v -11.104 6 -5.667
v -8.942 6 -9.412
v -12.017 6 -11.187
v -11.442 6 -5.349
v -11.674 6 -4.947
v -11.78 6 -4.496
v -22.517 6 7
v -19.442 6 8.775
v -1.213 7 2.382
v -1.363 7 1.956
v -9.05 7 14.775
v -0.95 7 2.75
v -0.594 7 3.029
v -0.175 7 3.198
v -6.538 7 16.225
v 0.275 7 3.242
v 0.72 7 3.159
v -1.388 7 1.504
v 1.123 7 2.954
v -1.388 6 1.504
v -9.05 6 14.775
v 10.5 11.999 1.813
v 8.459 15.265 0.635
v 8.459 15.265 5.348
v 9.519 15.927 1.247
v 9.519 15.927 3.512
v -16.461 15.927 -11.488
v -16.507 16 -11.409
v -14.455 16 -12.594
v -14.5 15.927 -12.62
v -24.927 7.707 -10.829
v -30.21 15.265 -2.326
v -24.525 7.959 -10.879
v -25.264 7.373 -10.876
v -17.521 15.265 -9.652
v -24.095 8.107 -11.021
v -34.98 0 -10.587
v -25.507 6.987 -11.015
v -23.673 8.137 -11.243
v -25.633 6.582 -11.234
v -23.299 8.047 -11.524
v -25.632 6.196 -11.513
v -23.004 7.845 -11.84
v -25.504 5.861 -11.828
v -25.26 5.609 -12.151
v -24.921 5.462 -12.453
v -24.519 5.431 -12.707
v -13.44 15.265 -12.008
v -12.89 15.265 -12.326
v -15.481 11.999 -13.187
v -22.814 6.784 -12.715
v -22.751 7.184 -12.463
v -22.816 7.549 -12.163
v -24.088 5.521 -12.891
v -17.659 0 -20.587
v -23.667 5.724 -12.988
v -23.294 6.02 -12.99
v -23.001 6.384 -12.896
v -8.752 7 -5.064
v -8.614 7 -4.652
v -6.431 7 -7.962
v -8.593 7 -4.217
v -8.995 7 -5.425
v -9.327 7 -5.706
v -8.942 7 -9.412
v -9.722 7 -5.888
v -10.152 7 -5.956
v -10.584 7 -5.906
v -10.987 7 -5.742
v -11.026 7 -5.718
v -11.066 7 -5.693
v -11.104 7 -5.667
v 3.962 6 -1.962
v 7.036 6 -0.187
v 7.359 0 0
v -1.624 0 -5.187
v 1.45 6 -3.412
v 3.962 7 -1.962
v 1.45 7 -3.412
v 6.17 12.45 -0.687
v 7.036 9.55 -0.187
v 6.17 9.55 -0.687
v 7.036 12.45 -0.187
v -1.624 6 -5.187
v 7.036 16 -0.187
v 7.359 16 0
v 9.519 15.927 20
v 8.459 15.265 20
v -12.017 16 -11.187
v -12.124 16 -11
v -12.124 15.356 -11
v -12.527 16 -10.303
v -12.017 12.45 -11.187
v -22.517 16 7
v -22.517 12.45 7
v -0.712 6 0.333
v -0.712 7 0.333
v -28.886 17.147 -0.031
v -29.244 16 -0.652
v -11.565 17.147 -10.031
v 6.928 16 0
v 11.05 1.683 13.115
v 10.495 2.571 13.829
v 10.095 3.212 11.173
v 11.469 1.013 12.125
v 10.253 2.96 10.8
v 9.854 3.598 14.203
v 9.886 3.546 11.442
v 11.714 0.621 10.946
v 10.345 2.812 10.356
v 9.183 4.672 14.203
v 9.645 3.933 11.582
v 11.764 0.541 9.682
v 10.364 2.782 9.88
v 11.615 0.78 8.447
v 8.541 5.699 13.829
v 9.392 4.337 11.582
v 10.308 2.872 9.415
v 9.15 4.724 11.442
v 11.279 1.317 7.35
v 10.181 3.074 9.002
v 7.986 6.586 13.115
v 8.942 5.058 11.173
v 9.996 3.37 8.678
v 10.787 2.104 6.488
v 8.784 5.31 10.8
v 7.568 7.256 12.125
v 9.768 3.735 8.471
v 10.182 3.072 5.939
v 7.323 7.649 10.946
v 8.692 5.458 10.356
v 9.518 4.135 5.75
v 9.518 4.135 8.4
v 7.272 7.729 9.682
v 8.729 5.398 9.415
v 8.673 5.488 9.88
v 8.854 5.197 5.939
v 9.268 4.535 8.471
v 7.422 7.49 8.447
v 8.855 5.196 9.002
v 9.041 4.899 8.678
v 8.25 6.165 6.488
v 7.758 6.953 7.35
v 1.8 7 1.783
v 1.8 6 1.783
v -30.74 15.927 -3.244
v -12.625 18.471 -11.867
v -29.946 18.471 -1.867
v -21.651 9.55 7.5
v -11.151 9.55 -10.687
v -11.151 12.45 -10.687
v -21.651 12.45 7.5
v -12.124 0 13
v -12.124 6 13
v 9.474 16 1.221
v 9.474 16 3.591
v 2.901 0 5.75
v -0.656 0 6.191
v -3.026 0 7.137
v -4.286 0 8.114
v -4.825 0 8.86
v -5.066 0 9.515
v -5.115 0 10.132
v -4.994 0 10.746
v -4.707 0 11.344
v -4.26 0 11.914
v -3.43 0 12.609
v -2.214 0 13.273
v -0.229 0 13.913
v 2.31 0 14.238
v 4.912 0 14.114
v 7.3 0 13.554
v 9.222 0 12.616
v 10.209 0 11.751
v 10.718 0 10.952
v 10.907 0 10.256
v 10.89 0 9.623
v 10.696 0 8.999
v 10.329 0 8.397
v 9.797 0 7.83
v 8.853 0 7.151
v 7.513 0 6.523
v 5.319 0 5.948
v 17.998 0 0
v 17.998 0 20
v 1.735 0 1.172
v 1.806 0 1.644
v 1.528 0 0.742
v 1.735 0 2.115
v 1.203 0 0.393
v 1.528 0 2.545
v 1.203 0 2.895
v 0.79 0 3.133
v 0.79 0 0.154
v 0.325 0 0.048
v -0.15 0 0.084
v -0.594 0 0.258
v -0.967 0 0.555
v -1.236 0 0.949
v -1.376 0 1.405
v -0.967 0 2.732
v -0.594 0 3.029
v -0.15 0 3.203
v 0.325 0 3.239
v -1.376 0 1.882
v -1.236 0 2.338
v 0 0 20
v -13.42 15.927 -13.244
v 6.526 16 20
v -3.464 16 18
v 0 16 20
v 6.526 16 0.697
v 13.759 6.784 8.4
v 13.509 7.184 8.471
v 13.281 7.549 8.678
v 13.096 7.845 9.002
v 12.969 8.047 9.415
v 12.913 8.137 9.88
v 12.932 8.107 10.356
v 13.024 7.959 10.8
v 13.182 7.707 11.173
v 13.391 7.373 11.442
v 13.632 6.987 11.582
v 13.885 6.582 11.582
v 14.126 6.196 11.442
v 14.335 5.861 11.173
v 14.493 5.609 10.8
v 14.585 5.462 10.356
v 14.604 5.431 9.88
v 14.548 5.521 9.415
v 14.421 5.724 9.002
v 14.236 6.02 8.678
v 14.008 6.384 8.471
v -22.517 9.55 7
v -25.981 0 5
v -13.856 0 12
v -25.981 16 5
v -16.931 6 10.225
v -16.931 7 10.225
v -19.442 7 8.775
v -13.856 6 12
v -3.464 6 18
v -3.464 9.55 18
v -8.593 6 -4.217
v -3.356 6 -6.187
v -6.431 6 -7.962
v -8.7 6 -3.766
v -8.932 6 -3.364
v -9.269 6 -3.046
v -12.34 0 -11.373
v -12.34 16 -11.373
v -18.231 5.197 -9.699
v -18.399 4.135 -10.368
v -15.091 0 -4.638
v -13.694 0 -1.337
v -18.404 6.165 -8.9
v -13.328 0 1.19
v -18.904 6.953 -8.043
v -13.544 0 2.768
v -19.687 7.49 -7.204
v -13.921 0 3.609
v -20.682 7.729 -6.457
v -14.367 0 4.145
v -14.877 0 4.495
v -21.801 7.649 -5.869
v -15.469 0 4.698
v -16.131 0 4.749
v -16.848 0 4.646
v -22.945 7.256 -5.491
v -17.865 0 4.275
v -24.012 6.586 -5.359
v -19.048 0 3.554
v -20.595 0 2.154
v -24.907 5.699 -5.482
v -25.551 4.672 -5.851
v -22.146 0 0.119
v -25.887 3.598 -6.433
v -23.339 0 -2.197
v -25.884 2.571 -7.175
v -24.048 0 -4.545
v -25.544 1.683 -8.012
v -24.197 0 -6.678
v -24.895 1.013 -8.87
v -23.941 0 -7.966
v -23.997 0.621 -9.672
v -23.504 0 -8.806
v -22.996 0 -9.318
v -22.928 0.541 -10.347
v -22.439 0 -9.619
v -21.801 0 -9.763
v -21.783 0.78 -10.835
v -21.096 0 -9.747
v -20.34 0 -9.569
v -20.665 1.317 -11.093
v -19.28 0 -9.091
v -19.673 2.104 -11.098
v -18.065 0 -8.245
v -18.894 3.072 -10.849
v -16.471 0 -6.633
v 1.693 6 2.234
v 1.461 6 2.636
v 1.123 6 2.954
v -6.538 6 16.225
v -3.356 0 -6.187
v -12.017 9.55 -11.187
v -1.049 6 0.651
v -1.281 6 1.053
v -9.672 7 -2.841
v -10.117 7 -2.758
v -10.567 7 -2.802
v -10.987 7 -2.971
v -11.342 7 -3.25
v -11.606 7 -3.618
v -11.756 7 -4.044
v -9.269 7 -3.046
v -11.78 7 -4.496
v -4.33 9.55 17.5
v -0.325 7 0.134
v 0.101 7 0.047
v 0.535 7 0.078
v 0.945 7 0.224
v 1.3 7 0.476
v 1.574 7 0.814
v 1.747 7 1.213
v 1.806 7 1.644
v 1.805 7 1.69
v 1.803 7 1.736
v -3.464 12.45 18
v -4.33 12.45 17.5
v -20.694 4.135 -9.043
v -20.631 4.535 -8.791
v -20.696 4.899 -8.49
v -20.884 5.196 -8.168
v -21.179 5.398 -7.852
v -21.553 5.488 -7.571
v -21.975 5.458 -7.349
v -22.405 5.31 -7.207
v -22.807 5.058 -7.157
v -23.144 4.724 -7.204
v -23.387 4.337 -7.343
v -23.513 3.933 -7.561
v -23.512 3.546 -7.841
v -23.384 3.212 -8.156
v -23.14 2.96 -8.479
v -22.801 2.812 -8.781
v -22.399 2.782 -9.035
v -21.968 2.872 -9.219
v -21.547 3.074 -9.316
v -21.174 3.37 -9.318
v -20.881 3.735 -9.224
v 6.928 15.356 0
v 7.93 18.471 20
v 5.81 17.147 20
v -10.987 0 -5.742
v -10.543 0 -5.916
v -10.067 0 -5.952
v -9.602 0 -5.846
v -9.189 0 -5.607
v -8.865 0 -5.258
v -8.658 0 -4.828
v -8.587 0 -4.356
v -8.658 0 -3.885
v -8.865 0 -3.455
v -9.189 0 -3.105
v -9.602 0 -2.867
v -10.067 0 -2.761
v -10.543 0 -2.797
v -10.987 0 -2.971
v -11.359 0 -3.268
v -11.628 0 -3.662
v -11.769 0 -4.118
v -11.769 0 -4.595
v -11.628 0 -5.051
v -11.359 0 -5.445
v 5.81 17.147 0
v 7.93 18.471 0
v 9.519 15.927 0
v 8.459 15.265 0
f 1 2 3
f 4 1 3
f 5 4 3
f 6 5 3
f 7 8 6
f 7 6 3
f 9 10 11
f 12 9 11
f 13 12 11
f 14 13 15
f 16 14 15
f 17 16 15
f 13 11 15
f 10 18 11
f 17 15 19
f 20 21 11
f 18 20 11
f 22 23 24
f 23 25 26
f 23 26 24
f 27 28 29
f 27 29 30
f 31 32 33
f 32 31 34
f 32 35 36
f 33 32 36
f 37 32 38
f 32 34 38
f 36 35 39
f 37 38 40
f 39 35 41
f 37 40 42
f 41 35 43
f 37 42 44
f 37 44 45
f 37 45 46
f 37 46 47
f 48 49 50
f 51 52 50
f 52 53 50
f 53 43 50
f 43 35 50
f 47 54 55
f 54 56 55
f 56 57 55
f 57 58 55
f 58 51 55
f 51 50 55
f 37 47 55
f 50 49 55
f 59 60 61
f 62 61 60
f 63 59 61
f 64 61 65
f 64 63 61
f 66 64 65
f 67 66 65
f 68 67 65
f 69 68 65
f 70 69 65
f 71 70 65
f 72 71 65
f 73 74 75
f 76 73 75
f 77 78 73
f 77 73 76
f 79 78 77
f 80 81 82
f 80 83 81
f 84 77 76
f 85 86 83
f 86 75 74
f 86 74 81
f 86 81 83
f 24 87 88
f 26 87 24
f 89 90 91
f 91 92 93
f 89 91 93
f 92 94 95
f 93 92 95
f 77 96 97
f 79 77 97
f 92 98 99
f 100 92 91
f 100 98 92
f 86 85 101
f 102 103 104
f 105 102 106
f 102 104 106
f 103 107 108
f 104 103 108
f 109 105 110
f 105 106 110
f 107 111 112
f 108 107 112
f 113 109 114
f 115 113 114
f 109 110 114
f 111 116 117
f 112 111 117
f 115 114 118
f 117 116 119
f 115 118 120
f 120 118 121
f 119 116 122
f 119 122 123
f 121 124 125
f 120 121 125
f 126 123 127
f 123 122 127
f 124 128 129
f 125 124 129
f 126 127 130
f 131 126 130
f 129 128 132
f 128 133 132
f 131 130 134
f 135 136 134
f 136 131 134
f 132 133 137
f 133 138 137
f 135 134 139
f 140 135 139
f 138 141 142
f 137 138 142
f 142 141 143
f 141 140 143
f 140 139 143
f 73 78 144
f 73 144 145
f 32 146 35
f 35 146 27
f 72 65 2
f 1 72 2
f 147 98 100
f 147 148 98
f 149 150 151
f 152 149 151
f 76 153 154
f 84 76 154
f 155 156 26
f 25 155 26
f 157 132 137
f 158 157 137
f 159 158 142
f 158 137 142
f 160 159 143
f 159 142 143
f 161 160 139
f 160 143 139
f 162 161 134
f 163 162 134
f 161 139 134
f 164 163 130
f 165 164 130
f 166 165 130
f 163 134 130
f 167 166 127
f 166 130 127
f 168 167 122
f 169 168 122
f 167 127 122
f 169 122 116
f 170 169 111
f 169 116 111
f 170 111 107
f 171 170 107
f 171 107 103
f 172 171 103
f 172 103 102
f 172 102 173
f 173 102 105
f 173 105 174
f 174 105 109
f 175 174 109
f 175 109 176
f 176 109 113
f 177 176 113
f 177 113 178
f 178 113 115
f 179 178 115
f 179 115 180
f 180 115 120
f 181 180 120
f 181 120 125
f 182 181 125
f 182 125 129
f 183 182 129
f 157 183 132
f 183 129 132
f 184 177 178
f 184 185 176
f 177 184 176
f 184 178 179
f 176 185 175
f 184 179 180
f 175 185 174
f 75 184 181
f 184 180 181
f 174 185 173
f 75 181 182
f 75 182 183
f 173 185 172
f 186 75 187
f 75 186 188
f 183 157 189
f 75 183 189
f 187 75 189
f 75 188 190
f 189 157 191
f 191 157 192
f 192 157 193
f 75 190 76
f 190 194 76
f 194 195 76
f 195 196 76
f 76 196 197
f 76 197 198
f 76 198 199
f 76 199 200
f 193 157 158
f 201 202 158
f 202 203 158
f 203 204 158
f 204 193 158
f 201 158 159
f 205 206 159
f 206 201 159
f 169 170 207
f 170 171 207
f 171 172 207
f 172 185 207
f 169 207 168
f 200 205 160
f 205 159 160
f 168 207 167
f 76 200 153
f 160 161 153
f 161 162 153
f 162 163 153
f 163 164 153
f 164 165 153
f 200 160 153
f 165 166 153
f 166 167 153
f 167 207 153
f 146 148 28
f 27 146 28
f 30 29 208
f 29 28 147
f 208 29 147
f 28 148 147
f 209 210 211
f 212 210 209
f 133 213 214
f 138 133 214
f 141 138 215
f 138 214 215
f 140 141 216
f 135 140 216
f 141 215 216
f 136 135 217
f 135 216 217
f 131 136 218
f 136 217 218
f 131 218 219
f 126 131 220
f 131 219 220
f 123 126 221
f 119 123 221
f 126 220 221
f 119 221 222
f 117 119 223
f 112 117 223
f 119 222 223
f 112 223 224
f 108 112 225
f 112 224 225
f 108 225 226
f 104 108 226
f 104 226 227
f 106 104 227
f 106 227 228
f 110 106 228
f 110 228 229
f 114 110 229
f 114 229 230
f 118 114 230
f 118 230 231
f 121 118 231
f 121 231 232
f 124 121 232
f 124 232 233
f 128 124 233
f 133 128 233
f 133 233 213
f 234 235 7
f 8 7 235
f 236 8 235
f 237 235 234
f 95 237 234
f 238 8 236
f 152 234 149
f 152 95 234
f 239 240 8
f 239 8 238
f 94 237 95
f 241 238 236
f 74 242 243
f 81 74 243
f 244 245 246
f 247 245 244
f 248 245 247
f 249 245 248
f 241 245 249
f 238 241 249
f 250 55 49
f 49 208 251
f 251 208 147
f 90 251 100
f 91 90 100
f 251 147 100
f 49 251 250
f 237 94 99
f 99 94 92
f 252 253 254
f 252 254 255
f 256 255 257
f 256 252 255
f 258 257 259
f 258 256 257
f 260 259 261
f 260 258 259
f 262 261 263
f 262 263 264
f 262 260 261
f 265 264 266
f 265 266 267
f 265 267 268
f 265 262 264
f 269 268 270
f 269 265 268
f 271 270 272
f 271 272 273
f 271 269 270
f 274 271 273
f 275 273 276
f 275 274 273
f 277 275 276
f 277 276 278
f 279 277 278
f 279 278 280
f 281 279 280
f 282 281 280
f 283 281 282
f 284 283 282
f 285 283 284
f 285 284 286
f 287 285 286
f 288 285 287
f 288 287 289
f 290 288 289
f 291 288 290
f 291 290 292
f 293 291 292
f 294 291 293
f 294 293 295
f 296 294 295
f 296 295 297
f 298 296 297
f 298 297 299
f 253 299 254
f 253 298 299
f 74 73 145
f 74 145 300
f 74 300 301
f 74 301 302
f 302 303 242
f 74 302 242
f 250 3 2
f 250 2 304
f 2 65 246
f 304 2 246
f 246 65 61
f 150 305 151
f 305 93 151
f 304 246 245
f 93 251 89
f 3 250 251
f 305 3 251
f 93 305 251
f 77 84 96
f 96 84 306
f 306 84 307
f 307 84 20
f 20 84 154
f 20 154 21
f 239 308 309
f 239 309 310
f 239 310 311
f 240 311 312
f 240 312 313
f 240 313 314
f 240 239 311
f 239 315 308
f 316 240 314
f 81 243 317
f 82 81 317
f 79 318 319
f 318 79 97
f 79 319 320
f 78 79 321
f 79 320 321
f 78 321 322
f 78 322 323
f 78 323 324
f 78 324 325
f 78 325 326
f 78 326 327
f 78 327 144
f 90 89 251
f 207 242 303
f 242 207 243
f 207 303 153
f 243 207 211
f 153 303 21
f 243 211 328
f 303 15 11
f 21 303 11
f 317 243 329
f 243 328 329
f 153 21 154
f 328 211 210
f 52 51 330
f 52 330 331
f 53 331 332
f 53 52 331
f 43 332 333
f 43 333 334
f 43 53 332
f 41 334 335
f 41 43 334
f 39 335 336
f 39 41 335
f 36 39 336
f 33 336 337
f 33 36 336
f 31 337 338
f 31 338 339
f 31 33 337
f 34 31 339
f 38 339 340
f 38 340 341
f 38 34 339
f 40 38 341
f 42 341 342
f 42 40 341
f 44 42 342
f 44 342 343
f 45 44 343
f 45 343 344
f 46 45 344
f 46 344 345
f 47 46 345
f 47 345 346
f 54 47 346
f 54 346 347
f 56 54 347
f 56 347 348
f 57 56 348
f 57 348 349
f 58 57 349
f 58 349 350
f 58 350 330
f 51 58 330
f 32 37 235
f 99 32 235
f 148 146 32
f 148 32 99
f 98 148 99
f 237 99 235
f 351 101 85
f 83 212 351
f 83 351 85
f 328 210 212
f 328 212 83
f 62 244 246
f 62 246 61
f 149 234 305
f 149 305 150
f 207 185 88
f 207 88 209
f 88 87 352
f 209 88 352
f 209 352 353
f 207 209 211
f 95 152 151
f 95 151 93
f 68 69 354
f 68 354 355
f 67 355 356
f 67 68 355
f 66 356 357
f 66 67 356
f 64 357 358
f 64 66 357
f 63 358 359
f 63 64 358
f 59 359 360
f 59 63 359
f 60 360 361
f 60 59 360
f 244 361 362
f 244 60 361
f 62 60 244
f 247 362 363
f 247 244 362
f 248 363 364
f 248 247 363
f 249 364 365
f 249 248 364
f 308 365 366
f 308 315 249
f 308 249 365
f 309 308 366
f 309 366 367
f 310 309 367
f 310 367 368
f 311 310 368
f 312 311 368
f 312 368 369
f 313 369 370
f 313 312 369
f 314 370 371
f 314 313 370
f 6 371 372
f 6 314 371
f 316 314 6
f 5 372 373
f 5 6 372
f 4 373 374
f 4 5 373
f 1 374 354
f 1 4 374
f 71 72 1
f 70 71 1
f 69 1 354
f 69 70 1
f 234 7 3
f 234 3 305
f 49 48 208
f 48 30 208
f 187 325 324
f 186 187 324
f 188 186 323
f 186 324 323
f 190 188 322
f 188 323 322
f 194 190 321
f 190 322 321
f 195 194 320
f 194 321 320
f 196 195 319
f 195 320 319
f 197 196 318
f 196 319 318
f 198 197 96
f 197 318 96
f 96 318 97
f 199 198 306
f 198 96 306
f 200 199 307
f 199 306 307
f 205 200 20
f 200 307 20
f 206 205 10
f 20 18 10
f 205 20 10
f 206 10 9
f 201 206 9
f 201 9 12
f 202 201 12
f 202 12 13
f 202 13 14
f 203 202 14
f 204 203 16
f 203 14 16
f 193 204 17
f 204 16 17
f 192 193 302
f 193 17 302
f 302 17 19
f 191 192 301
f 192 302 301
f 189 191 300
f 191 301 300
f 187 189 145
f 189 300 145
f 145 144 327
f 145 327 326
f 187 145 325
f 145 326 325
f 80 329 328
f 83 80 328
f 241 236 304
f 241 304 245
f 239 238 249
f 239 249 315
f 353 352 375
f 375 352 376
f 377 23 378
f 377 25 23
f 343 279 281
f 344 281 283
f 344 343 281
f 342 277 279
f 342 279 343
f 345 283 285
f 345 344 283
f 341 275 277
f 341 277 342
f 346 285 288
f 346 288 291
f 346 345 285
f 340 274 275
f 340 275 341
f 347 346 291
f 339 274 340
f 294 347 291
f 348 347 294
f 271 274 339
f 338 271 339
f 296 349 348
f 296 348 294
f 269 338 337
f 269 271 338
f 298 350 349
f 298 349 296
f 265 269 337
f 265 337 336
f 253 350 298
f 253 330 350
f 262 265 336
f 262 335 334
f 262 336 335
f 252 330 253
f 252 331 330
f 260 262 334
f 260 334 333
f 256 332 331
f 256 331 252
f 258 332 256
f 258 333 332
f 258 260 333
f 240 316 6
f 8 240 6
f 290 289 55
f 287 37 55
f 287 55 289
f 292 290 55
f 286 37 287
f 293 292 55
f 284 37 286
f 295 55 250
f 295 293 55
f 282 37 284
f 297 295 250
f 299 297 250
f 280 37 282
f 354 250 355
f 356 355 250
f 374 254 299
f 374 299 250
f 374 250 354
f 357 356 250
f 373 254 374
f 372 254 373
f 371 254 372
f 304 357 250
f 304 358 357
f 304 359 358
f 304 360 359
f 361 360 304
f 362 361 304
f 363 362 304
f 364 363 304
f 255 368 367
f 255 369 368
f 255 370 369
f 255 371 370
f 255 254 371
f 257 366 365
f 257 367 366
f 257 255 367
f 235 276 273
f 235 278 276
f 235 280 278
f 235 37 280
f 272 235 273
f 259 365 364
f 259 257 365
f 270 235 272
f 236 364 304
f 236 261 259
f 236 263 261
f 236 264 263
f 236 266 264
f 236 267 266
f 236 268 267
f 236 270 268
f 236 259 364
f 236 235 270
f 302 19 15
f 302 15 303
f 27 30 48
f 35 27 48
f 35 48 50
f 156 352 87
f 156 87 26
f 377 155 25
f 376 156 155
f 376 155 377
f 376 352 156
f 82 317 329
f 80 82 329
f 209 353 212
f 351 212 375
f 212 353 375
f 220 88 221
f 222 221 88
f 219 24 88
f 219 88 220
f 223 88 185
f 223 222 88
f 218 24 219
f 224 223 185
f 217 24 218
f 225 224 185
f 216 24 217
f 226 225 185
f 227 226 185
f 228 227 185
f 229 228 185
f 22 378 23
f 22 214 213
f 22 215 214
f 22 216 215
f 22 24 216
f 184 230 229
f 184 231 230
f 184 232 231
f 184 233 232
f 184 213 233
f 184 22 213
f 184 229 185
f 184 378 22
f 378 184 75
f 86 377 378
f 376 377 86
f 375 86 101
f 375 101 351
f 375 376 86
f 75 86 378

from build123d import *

# Parameters (mm, degrees)
MAIN_DEPTH                     = 20
ESQUISSE2_R                    = 1.6
HOLEFORLAUNCHERFIXING_DEPTH    = 26.158736213
ESQUISSE4_W                    = 22.287049145
ESQUISSE4_H                    = 34.815979295
ENL_V_MAT_EXTRU_3_DEPTH        = 6
MAKERBEANFIXING_DEPTH          = 21
ESQUISSE6_W                    = 20
ESQUISSE6_H                    = 3
ANTIROTATIONSYSTEM_DEPTH       = 1.25
ESQUISSE7_R                    = 1.6
TOPMAKERBEANFIXINGHOLE_DEPTH   = 30.249238927
ENL_V_MAT_EXTRU_4_DEPTH        = 33.636141089
ESQUISSE3_R                    = 4.25
BIGHOLEFORLAUNCHERFIXING_DEPTH = 32.680552778


with BuildPart() as part:
    # Esquisse1 → Main (new body)
    with BuildSketch(Plane.XY):
        Polygon((8, 16), (17.997909631, 0), (0, 0), (0, 16), align=None)
    extrude(amount=MAIN_DEPTH)

    # Esquisse2 → HoleForLauncherFixing (cut, through all)
    with BuildSketch(Plane(origin=(12.943836958, 8.088207011, 0), x_dir=(0, 0, -1), z_dir=(0.8480480961564272, 0.5299192642332031, 0))):
        with Locations((-10, -1.537439029)):
            Circle(ESQUISSE2_R)
    extrude(amount=-HOLEFORLAUNCHERFIXING_DEPTH, mode=Mode.SUBTRACT)

    # Esquisse4 → Enlèv. mat.-Extru.3 (cut)
    with BuildSketch(Plane(origin=(0, 0, 0), x_dir=(0, -1, 0), z_dir=(-0.8660254037844398, 0, -0.499999999999998))):
        with Locations((-6.644134867, 0.407683814)):
            Rectangle(ESQUISSE4_W, ESQUISSE4_H)
    extrude(amount=-ENL_V_MAT_EXTRU_3_DEPTH, mode=Mode.SUBTRACT)

    # Esquisse5 → MakerBeanFixing (add)
    with BuildSketch(Plane(origin=(-3.464101615, 0, 18), x_dir=(-0.8660254037844398, 0, -0.49999999999999806), z_dir=(0.499999999999998, 0, -0.8660254037844397))):
        Polygon((-4, 0), (10, 0), (10, 6), (6.45, 6), (6.45, 7), (3.55, 7), (3.55, 6), (0, 6), (0, 9.55), (1, 9.55), (1, 12.45), (0, 12.45), (0, 16), (-4, 16), align=None)
    extrude(amount=MAKERBEANFIXING_DEPTH)

    # Esquisse6 → AntiRotationSystem (add, symmetric)
    with BuildSketch(Plane(origin=(12.943836958, 8.088207011, 0), x_dir=(0, 0, -1), z_dir=(0.8480480961564272, 0.529919264233203, 0))):
        with Locations((-10, 9.962560971)):
            Rectangle(ESQUISSE6_W, ESQUISSE6_H)
    extrude(amount=ANTIROTATIONSYSTEM_DEPTH, both=True)

    # Esquisse7 → TopMakerBeanFixingHole (cut, through all)
    with BuildSketch(Plane(origin=(0, 7, 0), x_dir=(1, 0, 0), z_dir=(0, 1, 0))):
        with Locations((0.205771366, -1.643593539)):
            Circle(ESQUISSE7_R)
    extrude(amount=-TOPMAKERBEANFIXINGHOLE_DEPTH, mode=Mode.SUBTRACT)

    # Esquisse8 → Enlèv. mat.-Extru.4 (cut, through all)
    with BuildSketch(Plane(origin=(0, 0, 0), x_dir=(-1, 0, 0), z_dir=(0, 0, -1))):
        Polygon((-8.459362874, 15.264865731), (-17.997909631, 0), (-21.602114039, 2.252156873), (-10.47380949, 20.061166892), (-7.929665202, 18.4714091), (-9.519422995, 15.927264811), align=None)
    extrude(amount=-ENL_V_MAT_EXTRU_4_DEPTH, mode=Mode.SUBTRACT)

    # Esquisse3 → BigHoleForLauncherFixing (cut, through all)
    with BuildSketch(Plane(origin=(8.703596477, 5.43861069, 0), x_dir=(0, 0, -1), z_dir=(0.8480480961564272, 0.5299192642332031, 0))):
        with Locations((-10, -1.537439029)):
            Circle(ESQUISSE3_R)
    extrude(amount=-BIGHOLEFORLAUNCHERFIXING_DEPTH, mode=Mode.SUBTRACT)


with BuildPart() as body_2:
    # Mirror1: mirrored copy
    add(part.part.mirror(Plane(origin=(-4.330127019, 0, -2.5), x_dir=(-0.499999999999998, 0, 0.8660254037844398), z_dir=(-0.8660254037844398, 0, -0.499999999999998))))


solid = Compound([part.part, body_2.part])
